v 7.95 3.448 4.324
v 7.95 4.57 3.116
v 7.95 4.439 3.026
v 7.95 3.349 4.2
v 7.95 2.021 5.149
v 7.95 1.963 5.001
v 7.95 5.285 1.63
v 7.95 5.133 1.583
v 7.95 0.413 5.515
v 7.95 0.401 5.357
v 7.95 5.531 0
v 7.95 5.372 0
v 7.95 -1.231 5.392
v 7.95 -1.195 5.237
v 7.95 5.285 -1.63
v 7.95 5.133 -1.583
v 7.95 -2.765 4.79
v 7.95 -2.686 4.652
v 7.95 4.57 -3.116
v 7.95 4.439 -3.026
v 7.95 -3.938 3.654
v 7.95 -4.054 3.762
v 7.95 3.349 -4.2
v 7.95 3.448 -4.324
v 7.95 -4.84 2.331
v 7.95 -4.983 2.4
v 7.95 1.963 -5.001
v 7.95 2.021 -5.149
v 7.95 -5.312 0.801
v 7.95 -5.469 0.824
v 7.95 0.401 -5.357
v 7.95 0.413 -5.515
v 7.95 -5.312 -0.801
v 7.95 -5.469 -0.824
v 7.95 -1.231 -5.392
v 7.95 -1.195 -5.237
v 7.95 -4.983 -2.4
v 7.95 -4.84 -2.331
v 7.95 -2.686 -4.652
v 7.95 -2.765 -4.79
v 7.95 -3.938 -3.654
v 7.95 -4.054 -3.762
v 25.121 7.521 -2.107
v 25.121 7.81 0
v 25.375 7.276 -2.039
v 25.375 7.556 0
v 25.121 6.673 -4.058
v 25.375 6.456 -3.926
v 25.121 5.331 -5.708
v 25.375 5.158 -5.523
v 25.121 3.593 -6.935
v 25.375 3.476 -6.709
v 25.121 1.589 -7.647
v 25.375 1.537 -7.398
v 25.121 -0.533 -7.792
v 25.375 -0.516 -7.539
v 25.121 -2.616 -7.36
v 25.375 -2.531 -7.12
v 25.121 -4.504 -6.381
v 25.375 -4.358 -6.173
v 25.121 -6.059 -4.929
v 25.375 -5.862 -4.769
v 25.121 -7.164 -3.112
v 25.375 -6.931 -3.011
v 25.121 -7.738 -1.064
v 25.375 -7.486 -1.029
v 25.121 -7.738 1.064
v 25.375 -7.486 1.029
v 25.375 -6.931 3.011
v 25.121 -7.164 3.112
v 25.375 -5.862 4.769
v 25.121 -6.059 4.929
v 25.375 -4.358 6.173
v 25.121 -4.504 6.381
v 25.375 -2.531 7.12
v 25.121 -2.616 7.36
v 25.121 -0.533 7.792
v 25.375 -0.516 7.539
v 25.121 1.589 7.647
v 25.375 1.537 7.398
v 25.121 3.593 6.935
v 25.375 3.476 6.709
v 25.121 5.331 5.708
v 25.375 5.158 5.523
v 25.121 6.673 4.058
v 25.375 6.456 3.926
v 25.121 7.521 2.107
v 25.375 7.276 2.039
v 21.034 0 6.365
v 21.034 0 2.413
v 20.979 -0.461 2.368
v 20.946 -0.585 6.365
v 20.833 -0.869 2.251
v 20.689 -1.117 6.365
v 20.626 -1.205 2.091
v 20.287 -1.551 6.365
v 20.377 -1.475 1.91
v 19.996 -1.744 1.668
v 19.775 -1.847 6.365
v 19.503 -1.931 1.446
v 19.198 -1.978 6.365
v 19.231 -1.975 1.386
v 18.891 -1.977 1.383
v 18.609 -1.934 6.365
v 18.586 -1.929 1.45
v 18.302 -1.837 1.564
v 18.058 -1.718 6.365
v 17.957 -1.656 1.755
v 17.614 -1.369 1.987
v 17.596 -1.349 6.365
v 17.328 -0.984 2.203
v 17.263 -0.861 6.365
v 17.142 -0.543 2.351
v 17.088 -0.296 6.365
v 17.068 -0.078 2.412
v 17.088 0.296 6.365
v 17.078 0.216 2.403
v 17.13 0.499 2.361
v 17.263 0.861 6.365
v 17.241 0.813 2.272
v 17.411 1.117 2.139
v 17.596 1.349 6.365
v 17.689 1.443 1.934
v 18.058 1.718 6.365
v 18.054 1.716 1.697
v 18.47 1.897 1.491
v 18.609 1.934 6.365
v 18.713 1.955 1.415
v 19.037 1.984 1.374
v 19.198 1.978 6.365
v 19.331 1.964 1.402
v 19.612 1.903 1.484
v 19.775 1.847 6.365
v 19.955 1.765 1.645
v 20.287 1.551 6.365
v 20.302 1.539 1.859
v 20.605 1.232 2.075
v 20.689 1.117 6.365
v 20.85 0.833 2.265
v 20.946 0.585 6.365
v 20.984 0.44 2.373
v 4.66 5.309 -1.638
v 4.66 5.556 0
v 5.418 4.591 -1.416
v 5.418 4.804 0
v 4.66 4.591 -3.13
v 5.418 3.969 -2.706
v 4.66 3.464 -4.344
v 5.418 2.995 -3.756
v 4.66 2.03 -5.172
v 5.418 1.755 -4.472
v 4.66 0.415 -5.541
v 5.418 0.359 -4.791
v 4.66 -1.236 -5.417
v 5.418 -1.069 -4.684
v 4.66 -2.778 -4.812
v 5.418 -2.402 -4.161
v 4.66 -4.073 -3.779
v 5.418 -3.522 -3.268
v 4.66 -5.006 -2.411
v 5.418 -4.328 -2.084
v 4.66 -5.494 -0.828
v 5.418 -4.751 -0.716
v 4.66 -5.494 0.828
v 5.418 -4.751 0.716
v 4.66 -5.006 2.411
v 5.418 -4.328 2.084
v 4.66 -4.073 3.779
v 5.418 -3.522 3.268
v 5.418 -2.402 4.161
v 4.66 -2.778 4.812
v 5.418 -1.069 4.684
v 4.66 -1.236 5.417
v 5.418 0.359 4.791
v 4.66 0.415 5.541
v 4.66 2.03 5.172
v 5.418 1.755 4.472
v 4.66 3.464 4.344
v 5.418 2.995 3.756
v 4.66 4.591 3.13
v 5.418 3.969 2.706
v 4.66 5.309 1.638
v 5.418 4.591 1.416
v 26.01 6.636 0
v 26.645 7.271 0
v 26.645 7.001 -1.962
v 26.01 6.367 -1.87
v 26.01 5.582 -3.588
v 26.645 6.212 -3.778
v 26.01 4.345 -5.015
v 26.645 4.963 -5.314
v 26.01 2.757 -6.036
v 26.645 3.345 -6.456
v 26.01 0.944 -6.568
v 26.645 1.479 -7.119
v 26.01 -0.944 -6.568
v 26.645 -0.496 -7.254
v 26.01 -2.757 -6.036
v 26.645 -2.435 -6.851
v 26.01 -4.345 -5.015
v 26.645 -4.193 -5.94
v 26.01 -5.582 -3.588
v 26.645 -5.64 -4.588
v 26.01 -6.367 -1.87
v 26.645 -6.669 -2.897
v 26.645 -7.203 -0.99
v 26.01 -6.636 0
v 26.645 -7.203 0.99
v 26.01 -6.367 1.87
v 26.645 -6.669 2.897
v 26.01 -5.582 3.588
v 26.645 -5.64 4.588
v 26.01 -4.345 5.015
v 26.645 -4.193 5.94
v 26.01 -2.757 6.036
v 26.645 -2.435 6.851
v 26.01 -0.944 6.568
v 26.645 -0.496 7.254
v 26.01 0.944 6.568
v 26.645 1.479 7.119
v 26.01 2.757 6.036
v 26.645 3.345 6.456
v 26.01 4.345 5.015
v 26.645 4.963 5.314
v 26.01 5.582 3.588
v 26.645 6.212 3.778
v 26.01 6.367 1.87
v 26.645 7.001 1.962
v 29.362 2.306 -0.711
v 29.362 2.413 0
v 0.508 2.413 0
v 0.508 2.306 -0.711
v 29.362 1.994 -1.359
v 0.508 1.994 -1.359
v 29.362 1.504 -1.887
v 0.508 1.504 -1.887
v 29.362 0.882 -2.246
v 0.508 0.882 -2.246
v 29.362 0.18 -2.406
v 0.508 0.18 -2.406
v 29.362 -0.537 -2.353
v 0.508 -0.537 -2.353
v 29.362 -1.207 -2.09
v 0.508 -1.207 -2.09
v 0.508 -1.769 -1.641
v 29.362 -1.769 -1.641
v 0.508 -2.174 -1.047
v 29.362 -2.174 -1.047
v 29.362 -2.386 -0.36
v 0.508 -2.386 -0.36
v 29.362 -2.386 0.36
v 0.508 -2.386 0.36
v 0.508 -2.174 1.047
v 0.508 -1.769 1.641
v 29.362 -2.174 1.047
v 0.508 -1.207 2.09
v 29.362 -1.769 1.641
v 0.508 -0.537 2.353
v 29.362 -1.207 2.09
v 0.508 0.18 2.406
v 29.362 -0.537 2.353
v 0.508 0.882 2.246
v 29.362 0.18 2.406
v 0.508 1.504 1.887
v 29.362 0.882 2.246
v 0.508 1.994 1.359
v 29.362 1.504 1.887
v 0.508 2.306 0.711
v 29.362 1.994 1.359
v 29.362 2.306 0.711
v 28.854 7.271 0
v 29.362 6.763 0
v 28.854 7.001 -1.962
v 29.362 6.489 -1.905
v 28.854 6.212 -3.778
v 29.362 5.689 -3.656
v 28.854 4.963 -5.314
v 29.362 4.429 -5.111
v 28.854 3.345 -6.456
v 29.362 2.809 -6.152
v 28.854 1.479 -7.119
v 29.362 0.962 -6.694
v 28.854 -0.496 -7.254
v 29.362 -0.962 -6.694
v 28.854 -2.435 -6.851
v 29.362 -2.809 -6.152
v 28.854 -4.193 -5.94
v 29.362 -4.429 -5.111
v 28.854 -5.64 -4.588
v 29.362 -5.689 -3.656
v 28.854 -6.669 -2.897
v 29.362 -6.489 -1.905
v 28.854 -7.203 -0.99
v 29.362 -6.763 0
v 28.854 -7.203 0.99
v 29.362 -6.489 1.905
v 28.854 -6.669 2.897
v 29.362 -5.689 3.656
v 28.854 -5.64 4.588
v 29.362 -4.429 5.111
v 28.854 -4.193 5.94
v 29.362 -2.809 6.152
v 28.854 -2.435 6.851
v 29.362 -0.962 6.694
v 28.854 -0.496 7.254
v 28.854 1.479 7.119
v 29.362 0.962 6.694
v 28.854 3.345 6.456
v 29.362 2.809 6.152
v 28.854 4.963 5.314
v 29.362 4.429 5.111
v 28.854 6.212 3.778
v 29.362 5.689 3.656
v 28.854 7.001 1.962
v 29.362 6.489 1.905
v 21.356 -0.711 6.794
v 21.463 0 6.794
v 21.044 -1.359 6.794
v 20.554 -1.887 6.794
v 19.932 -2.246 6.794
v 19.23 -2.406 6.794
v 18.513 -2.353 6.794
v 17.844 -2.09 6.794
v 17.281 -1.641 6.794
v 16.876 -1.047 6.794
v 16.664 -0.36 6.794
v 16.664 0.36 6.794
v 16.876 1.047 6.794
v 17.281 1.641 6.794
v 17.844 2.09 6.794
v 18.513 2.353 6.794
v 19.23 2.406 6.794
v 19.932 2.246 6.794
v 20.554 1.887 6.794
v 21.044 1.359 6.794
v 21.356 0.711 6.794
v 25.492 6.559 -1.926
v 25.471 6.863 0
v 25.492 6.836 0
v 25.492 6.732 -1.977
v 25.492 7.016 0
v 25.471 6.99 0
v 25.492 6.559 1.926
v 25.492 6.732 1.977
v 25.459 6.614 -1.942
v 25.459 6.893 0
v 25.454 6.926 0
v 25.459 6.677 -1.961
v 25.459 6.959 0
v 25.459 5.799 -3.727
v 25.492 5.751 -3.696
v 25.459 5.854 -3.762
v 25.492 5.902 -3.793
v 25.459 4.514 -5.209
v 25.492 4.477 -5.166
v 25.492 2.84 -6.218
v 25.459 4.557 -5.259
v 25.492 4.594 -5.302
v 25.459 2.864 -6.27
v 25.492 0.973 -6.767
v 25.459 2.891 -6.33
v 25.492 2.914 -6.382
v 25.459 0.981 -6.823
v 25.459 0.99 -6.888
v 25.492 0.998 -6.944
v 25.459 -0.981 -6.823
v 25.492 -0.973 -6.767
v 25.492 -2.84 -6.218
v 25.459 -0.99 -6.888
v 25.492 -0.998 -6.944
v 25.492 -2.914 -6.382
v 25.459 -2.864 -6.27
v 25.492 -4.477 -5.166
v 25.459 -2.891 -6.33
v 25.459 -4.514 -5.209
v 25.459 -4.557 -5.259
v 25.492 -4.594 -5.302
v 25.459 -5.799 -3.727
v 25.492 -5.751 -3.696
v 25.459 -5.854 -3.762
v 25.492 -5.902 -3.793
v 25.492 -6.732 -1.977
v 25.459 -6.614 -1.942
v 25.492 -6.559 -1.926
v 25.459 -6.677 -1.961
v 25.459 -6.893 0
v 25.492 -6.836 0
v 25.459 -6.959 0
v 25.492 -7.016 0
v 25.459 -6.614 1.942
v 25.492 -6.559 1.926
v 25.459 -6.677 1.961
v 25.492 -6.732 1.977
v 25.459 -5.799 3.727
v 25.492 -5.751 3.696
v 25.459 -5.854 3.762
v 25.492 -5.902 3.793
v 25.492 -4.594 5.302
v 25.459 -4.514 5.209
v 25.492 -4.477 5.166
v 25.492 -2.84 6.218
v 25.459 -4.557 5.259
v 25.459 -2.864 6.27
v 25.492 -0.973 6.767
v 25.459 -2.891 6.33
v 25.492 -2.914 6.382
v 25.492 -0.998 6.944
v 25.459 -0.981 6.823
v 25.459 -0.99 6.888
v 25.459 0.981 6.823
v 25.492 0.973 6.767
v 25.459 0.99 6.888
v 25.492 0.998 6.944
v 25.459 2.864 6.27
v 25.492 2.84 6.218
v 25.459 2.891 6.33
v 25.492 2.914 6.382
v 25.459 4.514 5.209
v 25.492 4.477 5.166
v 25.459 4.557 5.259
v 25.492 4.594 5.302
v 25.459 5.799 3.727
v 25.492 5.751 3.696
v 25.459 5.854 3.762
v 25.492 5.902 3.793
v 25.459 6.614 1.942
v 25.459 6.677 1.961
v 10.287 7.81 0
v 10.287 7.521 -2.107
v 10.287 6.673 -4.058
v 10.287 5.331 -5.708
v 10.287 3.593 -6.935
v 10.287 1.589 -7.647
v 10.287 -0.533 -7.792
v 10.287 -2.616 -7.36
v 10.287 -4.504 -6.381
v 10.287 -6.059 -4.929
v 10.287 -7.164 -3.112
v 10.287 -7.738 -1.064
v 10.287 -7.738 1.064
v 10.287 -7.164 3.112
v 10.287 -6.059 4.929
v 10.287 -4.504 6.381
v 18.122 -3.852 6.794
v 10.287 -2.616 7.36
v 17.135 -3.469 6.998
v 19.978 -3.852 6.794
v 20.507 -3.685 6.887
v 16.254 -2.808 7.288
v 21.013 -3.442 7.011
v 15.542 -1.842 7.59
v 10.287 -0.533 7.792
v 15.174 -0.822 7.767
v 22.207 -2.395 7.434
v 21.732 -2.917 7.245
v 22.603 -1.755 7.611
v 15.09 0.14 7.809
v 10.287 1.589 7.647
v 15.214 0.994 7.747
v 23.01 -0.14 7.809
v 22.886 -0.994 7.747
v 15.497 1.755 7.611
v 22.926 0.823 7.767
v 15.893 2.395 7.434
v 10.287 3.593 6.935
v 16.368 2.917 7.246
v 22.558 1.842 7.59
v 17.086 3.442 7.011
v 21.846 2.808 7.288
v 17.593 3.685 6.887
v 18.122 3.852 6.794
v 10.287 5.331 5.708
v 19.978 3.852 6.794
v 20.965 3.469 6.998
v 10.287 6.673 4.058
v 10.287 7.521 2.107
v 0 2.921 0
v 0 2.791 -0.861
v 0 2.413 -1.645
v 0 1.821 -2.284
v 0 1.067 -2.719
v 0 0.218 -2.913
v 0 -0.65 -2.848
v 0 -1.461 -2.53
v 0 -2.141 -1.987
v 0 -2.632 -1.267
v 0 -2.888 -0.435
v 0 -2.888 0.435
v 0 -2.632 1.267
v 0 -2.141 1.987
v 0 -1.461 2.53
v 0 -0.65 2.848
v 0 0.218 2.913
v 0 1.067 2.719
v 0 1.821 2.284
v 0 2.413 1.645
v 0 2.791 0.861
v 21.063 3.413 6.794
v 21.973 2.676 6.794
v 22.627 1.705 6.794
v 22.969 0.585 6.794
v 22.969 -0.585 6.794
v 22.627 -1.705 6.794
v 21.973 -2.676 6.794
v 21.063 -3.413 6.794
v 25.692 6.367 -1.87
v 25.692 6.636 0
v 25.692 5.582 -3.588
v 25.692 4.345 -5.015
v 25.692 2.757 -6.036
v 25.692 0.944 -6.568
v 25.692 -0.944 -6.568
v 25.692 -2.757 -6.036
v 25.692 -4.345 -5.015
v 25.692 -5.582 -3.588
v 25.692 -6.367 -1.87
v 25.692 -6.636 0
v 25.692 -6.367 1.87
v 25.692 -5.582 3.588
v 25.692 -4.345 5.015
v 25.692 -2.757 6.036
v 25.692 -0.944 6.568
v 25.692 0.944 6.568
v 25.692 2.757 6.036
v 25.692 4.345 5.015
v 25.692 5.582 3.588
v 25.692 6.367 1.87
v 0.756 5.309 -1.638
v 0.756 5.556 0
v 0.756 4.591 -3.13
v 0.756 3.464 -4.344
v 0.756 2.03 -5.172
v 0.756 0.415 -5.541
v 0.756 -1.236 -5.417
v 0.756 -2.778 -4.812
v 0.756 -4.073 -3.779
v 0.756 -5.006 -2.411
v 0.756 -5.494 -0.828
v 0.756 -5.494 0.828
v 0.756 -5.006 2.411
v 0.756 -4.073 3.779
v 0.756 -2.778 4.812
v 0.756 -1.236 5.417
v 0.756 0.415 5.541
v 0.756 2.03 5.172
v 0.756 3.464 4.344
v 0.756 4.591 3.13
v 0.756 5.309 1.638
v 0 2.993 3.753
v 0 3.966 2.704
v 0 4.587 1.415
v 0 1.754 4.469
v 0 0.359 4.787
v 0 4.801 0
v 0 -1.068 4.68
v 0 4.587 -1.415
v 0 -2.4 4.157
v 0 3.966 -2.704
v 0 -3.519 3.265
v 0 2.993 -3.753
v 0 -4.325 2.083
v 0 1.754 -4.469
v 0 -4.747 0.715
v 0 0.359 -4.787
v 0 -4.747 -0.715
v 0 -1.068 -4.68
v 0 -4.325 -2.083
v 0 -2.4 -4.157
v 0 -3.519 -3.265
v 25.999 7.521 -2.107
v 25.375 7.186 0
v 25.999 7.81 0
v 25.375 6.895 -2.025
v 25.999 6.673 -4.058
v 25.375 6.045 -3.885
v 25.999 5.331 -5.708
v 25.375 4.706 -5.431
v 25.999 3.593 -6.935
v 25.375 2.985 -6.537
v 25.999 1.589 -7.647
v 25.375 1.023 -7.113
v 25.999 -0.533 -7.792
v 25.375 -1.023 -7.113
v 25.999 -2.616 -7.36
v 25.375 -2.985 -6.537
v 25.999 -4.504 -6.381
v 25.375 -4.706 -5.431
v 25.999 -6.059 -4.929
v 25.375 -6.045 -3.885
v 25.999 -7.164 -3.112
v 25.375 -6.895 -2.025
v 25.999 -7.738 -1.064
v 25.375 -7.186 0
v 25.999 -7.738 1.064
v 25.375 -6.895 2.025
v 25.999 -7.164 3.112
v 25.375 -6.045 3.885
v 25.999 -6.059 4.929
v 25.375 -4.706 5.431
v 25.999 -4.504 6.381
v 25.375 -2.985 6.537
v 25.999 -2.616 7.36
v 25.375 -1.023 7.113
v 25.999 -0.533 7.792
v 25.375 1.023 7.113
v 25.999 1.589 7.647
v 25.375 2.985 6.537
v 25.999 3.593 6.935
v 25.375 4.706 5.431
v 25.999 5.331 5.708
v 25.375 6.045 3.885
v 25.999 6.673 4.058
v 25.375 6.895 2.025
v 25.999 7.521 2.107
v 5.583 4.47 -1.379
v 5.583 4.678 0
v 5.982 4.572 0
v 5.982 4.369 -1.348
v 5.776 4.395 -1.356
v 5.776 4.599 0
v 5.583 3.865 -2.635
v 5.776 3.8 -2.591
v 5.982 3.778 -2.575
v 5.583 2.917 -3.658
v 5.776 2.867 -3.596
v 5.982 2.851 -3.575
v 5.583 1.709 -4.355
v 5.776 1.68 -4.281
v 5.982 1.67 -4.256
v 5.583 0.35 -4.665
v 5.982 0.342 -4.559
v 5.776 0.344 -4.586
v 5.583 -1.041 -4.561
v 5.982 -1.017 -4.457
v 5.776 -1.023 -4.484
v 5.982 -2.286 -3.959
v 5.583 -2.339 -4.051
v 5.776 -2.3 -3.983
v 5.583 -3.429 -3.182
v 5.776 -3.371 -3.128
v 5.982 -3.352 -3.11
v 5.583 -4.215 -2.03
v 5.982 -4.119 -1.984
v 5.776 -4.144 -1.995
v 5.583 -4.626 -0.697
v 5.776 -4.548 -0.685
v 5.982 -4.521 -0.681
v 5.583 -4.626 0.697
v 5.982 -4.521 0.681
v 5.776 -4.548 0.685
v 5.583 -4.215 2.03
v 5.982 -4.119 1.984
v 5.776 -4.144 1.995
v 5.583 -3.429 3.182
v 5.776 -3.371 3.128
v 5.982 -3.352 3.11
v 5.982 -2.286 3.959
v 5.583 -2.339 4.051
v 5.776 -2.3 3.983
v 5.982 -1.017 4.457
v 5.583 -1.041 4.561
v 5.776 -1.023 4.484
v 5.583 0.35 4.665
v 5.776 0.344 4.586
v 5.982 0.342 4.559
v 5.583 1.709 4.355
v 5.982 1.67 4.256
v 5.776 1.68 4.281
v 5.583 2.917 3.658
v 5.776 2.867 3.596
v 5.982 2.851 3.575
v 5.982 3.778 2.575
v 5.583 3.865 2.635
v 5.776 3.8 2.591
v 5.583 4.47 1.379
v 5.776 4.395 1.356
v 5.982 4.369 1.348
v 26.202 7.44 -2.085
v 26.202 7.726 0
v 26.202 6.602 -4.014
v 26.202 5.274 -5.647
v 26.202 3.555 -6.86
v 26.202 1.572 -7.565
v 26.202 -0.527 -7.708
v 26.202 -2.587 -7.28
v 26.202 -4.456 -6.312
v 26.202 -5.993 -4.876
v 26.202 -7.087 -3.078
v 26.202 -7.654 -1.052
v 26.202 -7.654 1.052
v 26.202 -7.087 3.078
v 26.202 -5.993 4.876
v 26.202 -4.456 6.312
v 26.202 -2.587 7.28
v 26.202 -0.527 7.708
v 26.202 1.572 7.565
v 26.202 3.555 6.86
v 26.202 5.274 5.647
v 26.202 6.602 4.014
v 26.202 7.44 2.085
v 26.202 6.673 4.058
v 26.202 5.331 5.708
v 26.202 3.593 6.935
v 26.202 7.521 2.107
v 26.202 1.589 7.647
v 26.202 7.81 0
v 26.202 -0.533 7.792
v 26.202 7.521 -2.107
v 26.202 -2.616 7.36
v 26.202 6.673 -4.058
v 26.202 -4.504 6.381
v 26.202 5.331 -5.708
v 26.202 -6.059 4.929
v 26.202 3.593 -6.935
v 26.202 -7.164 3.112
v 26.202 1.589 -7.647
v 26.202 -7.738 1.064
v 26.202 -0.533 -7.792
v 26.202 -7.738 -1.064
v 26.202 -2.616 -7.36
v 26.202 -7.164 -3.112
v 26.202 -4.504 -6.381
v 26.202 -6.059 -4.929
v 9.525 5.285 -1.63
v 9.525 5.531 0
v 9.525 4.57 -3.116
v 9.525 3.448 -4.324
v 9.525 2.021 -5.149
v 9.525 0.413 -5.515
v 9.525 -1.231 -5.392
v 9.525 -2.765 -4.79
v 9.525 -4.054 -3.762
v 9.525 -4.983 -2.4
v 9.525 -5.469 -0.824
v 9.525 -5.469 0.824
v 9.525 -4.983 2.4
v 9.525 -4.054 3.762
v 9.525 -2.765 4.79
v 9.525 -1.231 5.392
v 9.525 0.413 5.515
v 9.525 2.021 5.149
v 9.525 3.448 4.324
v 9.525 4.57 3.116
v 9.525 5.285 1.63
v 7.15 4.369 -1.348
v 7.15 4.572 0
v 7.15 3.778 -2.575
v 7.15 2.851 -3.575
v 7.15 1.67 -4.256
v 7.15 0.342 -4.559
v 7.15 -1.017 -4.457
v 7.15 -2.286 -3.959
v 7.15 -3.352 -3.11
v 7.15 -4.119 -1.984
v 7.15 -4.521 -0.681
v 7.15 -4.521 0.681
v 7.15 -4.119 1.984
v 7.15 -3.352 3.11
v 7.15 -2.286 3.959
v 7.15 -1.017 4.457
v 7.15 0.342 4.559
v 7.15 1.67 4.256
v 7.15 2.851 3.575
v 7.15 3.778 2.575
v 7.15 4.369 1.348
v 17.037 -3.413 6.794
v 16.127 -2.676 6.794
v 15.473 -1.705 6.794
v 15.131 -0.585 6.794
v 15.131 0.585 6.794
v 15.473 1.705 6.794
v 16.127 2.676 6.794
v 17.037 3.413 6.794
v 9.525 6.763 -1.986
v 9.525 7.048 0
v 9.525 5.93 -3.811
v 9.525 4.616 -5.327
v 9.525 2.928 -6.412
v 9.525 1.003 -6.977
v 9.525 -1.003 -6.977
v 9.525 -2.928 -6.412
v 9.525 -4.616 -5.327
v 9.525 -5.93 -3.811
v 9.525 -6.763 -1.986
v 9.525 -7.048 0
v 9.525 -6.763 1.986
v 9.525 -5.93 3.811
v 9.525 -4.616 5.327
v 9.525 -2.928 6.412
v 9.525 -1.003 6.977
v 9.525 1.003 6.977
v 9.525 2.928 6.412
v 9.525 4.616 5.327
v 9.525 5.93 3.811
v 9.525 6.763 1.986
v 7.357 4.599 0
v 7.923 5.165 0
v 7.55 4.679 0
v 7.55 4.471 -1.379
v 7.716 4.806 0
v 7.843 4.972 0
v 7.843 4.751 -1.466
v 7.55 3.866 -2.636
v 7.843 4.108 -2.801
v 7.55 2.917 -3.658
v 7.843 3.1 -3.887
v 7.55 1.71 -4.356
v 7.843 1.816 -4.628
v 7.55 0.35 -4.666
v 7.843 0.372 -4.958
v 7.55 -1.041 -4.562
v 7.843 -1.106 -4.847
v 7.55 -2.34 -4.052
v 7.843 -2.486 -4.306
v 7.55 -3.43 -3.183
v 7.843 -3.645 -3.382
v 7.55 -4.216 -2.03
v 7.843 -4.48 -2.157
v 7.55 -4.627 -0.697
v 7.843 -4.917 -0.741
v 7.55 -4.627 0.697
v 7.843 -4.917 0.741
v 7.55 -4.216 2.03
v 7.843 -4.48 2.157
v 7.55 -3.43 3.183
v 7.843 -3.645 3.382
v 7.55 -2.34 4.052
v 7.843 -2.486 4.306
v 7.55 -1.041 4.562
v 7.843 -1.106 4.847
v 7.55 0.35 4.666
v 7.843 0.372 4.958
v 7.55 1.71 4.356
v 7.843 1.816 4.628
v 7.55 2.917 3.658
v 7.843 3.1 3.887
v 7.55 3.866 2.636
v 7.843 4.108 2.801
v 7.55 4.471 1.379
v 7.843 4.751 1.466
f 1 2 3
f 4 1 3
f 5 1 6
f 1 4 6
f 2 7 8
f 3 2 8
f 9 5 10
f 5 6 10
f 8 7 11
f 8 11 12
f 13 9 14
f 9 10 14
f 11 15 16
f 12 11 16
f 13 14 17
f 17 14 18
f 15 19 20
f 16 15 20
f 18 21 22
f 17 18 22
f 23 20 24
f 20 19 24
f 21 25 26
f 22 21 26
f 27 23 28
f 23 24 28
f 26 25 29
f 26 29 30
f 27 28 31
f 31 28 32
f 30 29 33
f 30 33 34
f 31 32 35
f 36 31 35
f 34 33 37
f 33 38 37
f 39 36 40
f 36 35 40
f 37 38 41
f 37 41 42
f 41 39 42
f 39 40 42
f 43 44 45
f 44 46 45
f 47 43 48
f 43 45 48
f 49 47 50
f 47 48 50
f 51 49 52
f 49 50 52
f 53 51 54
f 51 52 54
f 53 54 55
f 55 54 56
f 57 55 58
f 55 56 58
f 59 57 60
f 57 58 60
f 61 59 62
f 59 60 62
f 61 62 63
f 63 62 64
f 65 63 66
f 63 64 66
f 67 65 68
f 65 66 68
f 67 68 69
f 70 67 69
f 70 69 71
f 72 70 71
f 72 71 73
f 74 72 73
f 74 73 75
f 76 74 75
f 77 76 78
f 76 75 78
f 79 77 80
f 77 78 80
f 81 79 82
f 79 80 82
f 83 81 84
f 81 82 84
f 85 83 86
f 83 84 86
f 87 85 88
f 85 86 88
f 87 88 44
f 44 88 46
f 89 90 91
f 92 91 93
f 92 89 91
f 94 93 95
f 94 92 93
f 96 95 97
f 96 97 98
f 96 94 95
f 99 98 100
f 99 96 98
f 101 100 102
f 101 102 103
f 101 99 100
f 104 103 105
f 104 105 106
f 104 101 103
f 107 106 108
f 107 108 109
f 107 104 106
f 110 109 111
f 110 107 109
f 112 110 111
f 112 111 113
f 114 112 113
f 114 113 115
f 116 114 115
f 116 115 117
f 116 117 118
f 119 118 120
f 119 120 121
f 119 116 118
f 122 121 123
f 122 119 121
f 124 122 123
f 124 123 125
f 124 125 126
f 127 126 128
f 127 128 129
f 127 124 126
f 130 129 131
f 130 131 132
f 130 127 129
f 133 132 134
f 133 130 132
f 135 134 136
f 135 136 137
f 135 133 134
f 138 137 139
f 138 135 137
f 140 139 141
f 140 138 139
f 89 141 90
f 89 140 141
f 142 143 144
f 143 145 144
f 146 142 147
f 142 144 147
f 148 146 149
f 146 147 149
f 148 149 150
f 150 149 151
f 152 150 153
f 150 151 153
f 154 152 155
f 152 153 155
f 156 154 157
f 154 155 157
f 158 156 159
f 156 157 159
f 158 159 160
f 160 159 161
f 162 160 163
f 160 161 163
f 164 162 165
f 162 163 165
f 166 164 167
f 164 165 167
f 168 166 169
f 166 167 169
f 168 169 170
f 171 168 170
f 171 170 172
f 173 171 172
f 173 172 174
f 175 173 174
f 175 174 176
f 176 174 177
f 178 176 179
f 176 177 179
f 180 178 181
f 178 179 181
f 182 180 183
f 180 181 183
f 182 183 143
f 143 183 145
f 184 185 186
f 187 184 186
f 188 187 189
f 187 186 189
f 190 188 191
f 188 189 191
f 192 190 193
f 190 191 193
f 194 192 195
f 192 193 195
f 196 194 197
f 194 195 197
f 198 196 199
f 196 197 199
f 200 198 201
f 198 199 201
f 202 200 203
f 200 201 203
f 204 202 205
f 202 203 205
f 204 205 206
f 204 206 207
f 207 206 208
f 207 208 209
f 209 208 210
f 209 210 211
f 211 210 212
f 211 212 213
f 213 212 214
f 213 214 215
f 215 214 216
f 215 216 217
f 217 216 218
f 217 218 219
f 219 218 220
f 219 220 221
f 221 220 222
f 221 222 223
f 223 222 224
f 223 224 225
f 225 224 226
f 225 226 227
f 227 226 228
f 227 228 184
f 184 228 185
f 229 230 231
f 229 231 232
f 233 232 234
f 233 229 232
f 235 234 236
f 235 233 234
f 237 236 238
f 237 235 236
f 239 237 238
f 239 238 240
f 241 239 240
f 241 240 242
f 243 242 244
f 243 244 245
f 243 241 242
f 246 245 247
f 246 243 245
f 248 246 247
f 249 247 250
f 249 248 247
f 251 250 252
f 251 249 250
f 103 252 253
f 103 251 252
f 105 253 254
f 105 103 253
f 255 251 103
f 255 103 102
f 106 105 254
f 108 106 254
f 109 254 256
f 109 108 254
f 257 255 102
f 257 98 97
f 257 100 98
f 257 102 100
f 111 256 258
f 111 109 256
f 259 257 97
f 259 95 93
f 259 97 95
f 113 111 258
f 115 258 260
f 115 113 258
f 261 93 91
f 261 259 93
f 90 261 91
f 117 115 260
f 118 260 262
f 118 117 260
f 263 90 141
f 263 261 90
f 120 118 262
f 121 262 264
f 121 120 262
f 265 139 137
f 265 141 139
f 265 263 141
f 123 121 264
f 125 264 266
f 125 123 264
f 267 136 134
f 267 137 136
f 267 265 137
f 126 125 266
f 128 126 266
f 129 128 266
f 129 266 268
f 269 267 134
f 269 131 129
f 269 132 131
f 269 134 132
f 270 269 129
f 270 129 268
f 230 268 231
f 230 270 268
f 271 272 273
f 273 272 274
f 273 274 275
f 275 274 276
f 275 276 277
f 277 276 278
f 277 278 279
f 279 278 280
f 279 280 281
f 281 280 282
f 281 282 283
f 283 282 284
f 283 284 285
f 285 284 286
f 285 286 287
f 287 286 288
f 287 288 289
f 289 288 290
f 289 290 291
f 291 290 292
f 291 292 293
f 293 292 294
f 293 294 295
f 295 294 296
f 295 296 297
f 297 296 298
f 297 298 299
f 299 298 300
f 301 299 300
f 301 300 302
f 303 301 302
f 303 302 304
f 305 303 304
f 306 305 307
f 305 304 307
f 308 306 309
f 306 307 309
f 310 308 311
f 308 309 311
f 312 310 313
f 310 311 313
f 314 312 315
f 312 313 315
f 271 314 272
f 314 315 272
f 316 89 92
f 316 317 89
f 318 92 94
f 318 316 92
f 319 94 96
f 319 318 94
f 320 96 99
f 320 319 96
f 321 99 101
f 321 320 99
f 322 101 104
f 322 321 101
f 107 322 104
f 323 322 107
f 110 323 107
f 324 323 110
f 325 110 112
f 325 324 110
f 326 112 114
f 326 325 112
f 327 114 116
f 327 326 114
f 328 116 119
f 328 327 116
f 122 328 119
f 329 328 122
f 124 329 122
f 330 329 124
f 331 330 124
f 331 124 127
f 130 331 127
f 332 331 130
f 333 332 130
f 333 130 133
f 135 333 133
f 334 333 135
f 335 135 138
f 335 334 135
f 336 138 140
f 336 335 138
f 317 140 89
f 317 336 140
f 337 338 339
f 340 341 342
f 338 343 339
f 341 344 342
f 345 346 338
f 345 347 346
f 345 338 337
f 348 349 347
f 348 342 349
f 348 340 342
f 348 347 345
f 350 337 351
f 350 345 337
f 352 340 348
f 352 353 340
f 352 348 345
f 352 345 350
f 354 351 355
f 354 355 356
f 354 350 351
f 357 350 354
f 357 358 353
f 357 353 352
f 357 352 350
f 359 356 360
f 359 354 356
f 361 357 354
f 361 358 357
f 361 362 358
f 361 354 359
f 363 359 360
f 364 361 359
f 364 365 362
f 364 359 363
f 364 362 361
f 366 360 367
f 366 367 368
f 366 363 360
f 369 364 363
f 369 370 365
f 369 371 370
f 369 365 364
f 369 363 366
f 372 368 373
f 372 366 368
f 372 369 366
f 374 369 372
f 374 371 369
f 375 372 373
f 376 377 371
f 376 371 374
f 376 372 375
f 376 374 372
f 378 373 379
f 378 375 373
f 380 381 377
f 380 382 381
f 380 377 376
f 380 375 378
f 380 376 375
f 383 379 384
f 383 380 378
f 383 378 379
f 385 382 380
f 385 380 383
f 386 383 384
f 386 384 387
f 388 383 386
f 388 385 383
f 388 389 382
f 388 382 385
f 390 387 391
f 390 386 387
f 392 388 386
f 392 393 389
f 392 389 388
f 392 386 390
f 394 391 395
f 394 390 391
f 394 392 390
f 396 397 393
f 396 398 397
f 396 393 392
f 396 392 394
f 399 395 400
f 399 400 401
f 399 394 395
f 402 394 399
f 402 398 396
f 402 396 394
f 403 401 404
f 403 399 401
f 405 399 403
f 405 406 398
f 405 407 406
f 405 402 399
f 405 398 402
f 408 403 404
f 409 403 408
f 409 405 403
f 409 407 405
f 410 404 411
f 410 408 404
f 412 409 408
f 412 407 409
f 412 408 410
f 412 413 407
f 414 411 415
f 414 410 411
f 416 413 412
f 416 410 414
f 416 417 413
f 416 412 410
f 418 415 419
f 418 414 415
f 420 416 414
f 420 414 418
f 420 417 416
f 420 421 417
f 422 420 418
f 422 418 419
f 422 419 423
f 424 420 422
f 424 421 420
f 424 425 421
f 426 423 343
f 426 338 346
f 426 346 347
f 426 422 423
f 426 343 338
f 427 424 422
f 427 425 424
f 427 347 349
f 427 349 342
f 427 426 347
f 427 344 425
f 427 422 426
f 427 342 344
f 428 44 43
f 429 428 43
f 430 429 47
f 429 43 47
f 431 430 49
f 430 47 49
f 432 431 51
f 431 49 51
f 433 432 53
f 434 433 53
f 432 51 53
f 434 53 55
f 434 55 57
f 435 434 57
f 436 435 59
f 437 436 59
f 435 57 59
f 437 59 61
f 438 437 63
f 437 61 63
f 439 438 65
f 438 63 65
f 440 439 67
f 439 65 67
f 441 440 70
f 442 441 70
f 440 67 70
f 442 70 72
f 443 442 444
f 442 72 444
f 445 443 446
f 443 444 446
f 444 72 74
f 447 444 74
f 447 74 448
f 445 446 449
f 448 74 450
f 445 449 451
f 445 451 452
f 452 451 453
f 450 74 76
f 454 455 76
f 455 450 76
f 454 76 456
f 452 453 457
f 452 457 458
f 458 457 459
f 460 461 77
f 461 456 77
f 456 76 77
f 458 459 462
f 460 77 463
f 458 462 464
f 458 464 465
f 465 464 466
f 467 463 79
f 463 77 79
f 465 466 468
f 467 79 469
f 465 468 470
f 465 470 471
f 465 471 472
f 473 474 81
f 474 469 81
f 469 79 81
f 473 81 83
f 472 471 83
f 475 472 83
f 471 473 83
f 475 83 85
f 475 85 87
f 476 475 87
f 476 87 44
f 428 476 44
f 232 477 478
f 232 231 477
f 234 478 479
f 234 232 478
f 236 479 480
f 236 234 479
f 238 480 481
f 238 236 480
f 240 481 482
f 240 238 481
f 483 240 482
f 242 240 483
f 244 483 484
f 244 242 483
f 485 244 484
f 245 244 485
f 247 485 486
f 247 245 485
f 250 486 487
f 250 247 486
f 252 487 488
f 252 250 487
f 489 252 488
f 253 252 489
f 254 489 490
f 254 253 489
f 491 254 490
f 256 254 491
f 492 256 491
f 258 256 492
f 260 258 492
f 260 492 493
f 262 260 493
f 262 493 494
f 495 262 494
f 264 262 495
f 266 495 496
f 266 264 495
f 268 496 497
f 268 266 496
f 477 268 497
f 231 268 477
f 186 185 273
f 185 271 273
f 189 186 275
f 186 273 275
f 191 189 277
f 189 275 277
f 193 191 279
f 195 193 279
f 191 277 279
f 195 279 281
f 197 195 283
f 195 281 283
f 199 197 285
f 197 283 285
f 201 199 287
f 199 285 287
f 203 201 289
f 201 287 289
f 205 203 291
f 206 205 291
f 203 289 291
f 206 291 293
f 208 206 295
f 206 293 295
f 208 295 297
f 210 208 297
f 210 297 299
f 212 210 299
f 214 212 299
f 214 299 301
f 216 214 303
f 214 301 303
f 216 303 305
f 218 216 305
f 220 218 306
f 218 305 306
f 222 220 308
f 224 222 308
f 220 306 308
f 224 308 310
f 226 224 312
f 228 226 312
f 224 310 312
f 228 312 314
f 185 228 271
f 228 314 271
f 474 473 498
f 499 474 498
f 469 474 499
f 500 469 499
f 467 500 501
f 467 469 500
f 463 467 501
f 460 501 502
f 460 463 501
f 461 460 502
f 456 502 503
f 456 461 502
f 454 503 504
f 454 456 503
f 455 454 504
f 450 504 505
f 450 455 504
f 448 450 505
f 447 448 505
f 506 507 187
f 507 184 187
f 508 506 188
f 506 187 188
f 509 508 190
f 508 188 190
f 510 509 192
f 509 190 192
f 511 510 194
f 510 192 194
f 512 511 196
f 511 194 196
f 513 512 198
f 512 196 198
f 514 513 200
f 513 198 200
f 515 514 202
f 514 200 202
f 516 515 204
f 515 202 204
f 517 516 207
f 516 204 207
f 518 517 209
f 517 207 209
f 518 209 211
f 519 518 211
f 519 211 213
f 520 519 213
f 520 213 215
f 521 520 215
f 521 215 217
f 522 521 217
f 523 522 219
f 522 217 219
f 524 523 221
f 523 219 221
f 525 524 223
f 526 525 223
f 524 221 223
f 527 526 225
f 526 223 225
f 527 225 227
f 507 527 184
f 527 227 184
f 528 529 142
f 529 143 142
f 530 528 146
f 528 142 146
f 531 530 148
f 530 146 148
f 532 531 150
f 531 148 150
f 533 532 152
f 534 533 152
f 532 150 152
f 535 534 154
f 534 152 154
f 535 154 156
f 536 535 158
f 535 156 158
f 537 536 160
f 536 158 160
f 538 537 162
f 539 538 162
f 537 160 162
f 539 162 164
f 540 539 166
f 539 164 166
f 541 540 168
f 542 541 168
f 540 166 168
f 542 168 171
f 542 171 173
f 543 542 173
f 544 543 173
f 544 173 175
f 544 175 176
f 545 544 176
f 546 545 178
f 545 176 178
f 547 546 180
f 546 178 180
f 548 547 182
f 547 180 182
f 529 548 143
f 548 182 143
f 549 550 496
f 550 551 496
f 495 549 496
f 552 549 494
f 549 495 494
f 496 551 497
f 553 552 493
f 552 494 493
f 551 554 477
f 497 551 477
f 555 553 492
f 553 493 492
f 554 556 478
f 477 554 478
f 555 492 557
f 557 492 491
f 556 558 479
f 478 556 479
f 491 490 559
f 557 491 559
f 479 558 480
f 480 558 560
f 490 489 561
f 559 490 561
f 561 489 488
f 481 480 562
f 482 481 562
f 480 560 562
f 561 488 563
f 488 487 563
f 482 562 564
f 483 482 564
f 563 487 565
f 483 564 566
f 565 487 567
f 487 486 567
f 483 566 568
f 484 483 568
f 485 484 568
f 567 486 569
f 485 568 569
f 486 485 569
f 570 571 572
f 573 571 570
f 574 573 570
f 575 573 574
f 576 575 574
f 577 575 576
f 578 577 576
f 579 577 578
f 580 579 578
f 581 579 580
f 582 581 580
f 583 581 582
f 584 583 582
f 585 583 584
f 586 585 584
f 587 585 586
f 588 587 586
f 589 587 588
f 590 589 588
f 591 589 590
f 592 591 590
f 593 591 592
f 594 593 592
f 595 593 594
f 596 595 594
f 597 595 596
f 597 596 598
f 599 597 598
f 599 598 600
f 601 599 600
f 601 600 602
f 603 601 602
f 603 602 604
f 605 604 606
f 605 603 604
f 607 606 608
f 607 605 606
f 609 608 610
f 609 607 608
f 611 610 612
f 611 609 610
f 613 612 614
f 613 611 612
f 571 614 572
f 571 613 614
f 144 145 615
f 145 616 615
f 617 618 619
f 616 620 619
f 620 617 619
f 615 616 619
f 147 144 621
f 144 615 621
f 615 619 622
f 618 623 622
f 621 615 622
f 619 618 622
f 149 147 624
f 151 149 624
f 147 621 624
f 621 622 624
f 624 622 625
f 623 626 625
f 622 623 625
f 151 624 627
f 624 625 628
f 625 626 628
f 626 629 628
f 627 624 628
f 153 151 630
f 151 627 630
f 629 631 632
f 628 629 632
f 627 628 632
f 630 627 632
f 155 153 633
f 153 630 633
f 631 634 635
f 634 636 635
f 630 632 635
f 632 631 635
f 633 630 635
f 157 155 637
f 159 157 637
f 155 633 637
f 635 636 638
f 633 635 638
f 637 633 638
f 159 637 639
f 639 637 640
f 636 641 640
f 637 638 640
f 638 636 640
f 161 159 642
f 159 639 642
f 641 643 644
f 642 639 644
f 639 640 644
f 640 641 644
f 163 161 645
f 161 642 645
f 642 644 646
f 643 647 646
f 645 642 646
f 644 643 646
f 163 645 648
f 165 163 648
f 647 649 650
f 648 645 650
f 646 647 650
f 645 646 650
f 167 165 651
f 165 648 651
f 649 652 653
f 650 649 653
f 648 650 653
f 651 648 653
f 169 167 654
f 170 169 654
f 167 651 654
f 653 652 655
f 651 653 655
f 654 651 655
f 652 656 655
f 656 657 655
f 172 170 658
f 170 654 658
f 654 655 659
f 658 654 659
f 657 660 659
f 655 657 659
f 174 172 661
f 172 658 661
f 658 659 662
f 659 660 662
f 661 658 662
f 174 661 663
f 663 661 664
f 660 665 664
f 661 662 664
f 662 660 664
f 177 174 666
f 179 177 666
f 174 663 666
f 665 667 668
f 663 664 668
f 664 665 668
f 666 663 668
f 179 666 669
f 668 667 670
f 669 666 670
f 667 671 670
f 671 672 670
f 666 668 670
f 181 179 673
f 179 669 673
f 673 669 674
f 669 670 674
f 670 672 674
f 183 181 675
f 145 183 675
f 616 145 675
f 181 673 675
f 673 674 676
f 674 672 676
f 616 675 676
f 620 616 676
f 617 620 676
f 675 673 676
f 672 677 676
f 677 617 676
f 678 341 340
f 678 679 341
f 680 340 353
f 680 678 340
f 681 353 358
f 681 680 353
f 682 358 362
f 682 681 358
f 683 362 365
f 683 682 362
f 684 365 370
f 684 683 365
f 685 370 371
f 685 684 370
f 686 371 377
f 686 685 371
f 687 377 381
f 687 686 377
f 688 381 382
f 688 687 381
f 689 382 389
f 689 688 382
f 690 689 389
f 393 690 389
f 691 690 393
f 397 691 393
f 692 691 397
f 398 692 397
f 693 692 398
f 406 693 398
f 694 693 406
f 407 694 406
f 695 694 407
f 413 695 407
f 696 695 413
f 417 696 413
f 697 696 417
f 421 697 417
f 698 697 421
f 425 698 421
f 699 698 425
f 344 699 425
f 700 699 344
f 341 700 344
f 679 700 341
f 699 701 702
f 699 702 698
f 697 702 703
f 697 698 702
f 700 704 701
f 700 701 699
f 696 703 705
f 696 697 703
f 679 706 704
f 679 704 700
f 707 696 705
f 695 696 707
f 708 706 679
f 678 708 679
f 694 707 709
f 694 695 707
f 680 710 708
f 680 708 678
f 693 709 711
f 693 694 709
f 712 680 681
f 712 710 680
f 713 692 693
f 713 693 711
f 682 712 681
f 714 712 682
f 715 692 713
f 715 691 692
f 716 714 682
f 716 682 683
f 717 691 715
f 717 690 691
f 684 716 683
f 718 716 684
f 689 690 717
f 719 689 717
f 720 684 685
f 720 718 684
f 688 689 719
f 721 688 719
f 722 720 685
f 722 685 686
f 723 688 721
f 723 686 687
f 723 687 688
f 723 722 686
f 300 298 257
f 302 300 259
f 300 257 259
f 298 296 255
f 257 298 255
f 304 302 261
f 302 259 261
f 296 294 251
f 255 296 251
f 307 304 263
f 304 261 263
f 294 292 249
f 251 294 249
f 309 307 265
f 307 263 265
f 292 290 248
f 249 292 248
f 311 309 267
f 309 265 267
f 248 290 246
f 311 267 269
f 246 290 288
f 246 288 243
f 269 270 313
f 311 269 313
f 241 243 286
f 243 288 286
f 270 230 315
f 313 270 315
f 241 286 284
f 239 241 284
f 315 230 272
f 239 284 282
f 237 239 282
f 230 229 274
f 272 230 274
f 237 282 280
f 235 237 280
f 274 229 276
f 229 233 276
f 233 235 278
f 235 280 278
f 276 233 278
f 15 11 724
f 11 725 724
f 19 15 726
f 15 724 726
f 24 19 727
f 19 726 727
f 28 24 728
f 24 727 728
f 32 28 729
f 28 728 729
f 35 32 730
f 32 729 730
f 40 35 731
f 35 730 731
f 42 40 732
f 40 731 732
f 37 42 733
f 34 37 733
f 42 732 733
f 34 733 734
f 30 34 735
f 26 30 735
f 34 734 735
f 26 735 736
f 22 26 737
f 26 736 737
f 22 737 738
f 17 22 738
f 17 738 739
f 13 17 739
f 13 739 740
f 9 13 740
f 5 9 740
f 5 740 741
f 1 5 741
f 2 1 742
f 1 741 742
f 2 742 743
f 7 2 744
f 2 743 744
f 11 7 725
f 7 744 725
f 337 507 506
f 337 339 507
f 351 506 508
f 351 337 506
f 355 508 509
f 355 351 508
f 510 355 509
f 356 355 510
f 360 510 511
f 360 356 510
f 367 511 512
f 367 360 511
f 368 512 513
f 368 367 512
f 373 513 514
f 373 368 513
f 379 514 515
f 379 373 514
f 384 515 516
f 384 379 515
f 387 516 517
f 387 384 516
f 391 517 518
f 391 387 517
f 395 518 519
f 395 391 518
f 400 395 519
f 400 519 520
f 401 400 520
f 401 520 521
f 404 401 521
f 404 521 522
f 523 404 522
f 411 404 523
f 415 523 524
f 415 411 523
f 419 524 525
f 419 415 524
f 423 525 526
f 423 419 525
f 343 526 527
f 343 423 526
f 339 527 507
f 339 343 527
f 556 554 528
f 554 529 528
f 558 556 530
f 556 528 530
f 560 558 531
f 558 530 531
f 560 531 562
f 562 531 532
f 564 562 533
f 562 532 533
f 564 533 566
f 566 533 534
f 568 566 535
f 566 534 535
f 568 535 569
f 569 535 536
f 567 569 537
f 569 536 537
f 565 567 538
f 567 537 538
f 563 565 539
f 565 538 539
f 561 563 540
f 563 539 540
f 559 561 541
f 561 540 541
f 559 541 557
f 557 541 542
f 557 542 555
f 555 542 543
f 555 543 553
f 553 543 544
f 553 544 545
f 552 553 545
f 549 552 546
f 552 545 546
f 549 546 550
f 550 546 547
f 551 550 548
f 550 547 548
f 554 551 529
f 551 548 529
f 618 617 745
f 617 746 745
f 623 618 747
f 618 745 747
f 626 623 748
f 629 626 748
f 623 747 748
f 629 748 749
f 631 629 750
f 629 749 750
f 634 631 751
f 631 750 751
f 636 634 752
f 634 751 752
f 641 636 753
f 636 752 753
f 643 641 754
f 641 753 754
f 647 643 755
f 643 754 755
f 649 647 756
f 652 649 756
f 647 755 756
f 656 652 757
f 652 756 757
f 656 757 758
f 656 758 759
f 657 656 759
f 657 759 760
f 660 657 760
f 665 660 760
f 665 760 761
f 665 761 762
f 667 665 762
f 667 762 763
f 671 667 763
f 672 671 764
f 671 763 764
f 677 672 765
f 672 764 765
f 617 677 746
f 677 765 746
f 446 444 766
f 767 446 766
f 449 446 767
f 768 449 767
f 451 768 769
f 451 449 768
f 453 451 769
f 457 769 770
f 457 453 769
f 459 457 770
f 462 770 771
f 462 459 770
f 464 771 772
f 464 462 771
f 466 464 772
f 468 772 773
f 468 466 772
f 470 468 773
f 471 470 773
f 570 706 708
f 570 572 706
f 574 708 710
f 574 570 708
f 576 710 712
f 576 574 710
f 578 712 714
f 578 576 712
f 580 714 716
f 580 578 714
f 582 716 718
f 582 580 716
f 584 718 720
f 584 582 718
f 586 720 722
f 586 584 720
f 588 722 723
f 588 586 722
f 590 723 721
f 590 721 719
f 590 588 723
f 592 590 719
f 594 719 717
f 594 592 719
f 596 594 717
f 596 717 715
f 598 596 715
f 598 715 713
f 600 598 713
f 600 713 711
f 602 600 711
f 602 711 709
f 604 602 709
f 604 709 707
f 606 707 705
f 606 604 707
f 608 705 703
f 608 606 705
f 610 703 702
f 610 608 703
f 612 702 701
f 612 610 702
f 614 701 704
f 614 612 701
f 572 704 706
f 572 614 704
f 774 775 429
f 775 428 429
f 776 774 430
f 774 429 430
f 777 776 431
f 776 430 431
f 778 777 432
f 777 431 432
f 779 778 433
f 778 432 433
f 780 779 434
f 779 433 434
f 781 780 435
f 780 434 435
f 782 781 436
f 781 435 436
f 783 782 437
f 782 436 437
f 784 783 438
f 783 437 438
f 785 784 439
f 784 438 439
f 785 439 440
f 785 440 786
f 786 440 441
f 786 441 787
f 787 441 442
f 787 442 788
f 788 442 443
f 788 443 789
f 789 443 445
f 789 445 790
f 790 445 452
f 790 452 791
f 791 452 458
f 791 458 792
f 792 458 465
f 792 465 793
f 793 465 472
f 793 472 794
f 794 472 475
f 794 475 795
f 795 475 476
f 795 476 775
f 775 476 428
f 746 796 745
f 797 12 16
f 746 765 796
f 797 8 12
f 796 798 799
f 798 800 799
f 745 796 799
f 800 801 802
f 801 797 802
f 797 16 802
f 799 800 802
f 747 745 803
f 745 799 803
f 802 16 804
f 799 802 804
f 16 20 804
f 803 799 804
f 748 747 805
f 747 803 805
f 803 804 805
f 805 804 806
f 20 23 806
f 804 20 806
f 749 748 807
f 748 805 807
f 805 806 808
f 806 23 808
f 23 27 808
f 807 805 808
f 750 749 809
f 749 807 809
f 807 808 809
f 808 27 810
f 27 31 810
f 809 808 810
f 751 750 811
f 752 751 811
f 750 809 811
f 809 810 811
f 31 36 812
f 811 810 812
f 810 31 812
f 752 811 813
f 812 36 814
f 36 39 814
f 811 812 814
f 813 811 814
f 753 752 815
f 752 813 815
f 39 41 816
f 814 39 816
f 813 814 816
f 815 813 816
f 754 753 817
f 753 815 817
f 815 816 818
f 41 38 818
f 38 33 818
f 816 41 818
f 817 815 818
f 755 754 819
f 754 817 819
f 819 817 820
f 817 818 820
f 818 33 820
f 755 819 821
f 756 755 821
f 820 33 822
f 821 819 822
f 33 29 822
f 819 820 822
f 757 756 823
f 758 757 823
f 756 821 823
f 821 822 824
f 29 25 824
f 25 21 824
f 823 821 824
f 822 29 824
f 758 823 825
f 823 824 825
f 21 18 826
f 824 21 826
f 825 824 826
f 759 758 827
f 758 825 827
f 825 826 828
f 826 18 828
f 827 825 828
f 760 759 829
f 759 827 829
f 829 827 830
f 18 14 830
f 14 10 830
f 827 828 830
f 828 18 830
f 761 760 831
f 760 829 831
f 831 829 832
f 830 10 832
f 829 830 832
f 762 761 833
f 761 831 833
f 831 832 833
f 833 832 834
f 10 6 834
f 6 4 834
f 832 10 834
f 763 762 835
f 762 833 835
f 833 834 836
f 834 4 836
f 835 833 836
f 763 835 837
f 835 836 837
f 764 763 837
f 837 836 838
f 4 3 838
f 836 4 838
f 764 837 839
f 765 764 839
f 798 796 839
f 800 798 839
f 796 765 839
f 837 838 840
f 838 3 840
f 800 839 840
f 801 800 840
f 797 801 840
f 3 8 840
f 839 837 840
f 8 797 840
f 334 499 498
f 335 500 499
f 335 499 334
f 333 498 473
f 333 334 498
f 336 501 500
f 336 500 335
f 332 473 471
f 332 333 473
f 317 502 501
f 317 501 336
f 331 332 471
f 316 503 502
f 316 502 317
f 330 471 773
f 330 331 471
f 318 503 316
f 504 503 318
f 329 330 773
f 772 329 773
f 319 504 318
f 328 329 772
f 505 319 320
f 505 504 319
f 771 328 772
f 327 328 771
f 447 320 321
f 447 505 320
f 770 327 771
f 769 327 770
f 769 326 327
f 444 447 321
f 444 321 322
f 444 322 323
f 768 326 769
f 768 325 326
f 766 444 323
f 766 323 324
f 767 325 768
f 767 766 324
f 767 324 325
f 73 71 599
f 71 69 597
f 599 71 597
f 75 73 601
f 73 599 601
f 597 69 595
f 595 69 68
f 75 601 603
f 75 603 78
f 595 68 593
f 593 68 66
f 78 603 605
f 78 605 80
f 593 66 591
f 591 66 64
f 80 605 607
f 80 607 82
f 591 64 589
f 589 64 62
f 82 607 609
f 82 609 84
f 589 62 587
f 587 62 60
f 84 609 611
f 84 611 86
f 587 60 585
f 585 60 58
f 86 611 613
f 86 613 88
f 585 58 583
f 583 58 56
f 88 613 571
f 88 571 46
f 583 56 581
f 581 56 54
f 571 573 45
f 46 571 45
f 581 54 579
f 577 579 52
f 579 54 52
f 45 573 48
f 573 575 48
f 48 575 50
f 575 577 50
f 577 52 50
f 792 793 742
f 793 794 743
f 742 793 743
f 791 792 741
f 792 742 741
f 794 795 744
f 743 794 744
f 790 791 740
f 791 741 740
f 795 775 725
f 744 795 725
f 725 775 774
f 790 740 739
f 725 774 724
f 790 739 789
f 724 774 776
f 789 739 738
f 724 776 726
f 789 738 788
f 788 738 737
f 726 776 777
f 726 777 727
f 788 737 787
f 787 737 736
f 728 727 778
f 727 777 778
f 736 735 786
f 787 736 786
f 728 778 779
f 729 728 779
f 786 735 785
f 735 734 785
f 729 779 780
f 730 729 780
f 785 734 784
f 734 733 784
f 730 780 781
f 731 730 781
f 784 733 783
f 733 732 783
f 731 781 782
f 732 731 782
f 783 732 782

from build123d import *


with BuildPart() as part:
    # Sketch1 → Revolve1 (revolve)
    with BuildSketch(Plane.XY):
        with BuildLine():
            Line((0, 0), (0, 4.8006))
            Line((0, 4.8006), (0.75565, 5.55625))
            Line((0.75565, 5.55625), (4.660293864, 5.55625))
            Line((4.660293864, 5.55625), (5.418103291, 4.804192648))
            ThreePointArc((5.418103291, 4.804192648), (5.676923575, 4.6323221), (5.9817, 4.572))
            Line((5.9817, 4.572), (7.1501, 4.572))
            ThreePointArc((7.1501, 4.572), (7.715856136, 4.806343864), (7.9502, 5.3721))
            Line((7.9502, 5.3721), (7.9502, 5.53085))
            Line((7.9502, 5.53085), (9.525, 5.53085))
            Line((9.525, 5.53085), (9.525, 0))
            Line((9.525, 0), (0, 0))
        make_face()
    revolve(axis=Axis((9.525, 0, 0), (-1, 0, 0)))

    # Sketch2 → Revolve2 (revolve)
    with BuildSketch(Plane.XY):
        Polygon((9.525, 0), (9.525, 7.0485), (10.287, 7.8105), (25.1206, 7.8105), (25.3746, 7.5565), (25.3746, 6.63575), (26.0096, 6.63575), (26.6446, 7.27075), (28.8544, 7.27075), (29.3624, 6.76275), (29.3624, 0), align=None)
    revolve(axis=Axis((29.3624, 0, 0), (-1, 0, 0)))

    # Sketch3 → Cut-Revolve1 (revolve, cut)
    with BuildSketch(Plane.XY):
        Polygon((0, 0), (0, 2.921), (0.508, 2.413), (29.3624, 2.413), (29.3624, 0), align=None)
    revolve(axis=Axis((29.3624, 0, 0), (-1, 0, 0)), mode=Mode.SUBTRACT)

    # Sketch4 → Cut-Revolve2 (revolve, cut)
    with BuildSketch(Plane(origin=(0, 0, 0), x_dir=(1, 0, 0), z_dir=(0, 1, 0))):
        Polygon((19.05, 1.016), (21.03374, 1.016), (21.03374, -6.36524), (21.463, -6.7945), (23.0124, -6.7945), (23.0124, -7.8105), (19.05, -7.8105), align=None)
    revolve(axis=Axis((19.05, 0, 7.8105), (0, 0, -1)), mode=Mode.SUBTRACT)

    # Sketch5 → Revolve3 (revolve)
    with BuildSketch(Plane.XY):
        with BuildLine():
            Line((25.3746, 7.186143808), (25.3746, 6.38175))
            Line((25.3746, 6.38175), (26.0096, 6.38175))
            Line((26.0096, 6.38175), (26.0096, 6.63575))
            Line((26.0096, 6.63575), (25.6921, 6.63575))
            Line((25.6921, 6.63575), (25.491639755, 6.836210245))
            ThreePointArc((25.491639755, 6.836210245), (25.454442316, 6.926012806), (25.491639755, 7.015815367))
            Line((25.491639755, 7.015815367), (26.202156192, 7.726331804))
            Line((26.202156192, 7.726331804), (26.202156192, 7.8105))
            Line((26.202156192, 7.8105), (25.998956192, 7.8105))
            Line((25.998956192, 7.8105), (25.3746, 7.186143808))
        make_face()
    revolve(axis=Axis((26.0096, 0, 0), (-1, 0, 0)))


solid = part.part
